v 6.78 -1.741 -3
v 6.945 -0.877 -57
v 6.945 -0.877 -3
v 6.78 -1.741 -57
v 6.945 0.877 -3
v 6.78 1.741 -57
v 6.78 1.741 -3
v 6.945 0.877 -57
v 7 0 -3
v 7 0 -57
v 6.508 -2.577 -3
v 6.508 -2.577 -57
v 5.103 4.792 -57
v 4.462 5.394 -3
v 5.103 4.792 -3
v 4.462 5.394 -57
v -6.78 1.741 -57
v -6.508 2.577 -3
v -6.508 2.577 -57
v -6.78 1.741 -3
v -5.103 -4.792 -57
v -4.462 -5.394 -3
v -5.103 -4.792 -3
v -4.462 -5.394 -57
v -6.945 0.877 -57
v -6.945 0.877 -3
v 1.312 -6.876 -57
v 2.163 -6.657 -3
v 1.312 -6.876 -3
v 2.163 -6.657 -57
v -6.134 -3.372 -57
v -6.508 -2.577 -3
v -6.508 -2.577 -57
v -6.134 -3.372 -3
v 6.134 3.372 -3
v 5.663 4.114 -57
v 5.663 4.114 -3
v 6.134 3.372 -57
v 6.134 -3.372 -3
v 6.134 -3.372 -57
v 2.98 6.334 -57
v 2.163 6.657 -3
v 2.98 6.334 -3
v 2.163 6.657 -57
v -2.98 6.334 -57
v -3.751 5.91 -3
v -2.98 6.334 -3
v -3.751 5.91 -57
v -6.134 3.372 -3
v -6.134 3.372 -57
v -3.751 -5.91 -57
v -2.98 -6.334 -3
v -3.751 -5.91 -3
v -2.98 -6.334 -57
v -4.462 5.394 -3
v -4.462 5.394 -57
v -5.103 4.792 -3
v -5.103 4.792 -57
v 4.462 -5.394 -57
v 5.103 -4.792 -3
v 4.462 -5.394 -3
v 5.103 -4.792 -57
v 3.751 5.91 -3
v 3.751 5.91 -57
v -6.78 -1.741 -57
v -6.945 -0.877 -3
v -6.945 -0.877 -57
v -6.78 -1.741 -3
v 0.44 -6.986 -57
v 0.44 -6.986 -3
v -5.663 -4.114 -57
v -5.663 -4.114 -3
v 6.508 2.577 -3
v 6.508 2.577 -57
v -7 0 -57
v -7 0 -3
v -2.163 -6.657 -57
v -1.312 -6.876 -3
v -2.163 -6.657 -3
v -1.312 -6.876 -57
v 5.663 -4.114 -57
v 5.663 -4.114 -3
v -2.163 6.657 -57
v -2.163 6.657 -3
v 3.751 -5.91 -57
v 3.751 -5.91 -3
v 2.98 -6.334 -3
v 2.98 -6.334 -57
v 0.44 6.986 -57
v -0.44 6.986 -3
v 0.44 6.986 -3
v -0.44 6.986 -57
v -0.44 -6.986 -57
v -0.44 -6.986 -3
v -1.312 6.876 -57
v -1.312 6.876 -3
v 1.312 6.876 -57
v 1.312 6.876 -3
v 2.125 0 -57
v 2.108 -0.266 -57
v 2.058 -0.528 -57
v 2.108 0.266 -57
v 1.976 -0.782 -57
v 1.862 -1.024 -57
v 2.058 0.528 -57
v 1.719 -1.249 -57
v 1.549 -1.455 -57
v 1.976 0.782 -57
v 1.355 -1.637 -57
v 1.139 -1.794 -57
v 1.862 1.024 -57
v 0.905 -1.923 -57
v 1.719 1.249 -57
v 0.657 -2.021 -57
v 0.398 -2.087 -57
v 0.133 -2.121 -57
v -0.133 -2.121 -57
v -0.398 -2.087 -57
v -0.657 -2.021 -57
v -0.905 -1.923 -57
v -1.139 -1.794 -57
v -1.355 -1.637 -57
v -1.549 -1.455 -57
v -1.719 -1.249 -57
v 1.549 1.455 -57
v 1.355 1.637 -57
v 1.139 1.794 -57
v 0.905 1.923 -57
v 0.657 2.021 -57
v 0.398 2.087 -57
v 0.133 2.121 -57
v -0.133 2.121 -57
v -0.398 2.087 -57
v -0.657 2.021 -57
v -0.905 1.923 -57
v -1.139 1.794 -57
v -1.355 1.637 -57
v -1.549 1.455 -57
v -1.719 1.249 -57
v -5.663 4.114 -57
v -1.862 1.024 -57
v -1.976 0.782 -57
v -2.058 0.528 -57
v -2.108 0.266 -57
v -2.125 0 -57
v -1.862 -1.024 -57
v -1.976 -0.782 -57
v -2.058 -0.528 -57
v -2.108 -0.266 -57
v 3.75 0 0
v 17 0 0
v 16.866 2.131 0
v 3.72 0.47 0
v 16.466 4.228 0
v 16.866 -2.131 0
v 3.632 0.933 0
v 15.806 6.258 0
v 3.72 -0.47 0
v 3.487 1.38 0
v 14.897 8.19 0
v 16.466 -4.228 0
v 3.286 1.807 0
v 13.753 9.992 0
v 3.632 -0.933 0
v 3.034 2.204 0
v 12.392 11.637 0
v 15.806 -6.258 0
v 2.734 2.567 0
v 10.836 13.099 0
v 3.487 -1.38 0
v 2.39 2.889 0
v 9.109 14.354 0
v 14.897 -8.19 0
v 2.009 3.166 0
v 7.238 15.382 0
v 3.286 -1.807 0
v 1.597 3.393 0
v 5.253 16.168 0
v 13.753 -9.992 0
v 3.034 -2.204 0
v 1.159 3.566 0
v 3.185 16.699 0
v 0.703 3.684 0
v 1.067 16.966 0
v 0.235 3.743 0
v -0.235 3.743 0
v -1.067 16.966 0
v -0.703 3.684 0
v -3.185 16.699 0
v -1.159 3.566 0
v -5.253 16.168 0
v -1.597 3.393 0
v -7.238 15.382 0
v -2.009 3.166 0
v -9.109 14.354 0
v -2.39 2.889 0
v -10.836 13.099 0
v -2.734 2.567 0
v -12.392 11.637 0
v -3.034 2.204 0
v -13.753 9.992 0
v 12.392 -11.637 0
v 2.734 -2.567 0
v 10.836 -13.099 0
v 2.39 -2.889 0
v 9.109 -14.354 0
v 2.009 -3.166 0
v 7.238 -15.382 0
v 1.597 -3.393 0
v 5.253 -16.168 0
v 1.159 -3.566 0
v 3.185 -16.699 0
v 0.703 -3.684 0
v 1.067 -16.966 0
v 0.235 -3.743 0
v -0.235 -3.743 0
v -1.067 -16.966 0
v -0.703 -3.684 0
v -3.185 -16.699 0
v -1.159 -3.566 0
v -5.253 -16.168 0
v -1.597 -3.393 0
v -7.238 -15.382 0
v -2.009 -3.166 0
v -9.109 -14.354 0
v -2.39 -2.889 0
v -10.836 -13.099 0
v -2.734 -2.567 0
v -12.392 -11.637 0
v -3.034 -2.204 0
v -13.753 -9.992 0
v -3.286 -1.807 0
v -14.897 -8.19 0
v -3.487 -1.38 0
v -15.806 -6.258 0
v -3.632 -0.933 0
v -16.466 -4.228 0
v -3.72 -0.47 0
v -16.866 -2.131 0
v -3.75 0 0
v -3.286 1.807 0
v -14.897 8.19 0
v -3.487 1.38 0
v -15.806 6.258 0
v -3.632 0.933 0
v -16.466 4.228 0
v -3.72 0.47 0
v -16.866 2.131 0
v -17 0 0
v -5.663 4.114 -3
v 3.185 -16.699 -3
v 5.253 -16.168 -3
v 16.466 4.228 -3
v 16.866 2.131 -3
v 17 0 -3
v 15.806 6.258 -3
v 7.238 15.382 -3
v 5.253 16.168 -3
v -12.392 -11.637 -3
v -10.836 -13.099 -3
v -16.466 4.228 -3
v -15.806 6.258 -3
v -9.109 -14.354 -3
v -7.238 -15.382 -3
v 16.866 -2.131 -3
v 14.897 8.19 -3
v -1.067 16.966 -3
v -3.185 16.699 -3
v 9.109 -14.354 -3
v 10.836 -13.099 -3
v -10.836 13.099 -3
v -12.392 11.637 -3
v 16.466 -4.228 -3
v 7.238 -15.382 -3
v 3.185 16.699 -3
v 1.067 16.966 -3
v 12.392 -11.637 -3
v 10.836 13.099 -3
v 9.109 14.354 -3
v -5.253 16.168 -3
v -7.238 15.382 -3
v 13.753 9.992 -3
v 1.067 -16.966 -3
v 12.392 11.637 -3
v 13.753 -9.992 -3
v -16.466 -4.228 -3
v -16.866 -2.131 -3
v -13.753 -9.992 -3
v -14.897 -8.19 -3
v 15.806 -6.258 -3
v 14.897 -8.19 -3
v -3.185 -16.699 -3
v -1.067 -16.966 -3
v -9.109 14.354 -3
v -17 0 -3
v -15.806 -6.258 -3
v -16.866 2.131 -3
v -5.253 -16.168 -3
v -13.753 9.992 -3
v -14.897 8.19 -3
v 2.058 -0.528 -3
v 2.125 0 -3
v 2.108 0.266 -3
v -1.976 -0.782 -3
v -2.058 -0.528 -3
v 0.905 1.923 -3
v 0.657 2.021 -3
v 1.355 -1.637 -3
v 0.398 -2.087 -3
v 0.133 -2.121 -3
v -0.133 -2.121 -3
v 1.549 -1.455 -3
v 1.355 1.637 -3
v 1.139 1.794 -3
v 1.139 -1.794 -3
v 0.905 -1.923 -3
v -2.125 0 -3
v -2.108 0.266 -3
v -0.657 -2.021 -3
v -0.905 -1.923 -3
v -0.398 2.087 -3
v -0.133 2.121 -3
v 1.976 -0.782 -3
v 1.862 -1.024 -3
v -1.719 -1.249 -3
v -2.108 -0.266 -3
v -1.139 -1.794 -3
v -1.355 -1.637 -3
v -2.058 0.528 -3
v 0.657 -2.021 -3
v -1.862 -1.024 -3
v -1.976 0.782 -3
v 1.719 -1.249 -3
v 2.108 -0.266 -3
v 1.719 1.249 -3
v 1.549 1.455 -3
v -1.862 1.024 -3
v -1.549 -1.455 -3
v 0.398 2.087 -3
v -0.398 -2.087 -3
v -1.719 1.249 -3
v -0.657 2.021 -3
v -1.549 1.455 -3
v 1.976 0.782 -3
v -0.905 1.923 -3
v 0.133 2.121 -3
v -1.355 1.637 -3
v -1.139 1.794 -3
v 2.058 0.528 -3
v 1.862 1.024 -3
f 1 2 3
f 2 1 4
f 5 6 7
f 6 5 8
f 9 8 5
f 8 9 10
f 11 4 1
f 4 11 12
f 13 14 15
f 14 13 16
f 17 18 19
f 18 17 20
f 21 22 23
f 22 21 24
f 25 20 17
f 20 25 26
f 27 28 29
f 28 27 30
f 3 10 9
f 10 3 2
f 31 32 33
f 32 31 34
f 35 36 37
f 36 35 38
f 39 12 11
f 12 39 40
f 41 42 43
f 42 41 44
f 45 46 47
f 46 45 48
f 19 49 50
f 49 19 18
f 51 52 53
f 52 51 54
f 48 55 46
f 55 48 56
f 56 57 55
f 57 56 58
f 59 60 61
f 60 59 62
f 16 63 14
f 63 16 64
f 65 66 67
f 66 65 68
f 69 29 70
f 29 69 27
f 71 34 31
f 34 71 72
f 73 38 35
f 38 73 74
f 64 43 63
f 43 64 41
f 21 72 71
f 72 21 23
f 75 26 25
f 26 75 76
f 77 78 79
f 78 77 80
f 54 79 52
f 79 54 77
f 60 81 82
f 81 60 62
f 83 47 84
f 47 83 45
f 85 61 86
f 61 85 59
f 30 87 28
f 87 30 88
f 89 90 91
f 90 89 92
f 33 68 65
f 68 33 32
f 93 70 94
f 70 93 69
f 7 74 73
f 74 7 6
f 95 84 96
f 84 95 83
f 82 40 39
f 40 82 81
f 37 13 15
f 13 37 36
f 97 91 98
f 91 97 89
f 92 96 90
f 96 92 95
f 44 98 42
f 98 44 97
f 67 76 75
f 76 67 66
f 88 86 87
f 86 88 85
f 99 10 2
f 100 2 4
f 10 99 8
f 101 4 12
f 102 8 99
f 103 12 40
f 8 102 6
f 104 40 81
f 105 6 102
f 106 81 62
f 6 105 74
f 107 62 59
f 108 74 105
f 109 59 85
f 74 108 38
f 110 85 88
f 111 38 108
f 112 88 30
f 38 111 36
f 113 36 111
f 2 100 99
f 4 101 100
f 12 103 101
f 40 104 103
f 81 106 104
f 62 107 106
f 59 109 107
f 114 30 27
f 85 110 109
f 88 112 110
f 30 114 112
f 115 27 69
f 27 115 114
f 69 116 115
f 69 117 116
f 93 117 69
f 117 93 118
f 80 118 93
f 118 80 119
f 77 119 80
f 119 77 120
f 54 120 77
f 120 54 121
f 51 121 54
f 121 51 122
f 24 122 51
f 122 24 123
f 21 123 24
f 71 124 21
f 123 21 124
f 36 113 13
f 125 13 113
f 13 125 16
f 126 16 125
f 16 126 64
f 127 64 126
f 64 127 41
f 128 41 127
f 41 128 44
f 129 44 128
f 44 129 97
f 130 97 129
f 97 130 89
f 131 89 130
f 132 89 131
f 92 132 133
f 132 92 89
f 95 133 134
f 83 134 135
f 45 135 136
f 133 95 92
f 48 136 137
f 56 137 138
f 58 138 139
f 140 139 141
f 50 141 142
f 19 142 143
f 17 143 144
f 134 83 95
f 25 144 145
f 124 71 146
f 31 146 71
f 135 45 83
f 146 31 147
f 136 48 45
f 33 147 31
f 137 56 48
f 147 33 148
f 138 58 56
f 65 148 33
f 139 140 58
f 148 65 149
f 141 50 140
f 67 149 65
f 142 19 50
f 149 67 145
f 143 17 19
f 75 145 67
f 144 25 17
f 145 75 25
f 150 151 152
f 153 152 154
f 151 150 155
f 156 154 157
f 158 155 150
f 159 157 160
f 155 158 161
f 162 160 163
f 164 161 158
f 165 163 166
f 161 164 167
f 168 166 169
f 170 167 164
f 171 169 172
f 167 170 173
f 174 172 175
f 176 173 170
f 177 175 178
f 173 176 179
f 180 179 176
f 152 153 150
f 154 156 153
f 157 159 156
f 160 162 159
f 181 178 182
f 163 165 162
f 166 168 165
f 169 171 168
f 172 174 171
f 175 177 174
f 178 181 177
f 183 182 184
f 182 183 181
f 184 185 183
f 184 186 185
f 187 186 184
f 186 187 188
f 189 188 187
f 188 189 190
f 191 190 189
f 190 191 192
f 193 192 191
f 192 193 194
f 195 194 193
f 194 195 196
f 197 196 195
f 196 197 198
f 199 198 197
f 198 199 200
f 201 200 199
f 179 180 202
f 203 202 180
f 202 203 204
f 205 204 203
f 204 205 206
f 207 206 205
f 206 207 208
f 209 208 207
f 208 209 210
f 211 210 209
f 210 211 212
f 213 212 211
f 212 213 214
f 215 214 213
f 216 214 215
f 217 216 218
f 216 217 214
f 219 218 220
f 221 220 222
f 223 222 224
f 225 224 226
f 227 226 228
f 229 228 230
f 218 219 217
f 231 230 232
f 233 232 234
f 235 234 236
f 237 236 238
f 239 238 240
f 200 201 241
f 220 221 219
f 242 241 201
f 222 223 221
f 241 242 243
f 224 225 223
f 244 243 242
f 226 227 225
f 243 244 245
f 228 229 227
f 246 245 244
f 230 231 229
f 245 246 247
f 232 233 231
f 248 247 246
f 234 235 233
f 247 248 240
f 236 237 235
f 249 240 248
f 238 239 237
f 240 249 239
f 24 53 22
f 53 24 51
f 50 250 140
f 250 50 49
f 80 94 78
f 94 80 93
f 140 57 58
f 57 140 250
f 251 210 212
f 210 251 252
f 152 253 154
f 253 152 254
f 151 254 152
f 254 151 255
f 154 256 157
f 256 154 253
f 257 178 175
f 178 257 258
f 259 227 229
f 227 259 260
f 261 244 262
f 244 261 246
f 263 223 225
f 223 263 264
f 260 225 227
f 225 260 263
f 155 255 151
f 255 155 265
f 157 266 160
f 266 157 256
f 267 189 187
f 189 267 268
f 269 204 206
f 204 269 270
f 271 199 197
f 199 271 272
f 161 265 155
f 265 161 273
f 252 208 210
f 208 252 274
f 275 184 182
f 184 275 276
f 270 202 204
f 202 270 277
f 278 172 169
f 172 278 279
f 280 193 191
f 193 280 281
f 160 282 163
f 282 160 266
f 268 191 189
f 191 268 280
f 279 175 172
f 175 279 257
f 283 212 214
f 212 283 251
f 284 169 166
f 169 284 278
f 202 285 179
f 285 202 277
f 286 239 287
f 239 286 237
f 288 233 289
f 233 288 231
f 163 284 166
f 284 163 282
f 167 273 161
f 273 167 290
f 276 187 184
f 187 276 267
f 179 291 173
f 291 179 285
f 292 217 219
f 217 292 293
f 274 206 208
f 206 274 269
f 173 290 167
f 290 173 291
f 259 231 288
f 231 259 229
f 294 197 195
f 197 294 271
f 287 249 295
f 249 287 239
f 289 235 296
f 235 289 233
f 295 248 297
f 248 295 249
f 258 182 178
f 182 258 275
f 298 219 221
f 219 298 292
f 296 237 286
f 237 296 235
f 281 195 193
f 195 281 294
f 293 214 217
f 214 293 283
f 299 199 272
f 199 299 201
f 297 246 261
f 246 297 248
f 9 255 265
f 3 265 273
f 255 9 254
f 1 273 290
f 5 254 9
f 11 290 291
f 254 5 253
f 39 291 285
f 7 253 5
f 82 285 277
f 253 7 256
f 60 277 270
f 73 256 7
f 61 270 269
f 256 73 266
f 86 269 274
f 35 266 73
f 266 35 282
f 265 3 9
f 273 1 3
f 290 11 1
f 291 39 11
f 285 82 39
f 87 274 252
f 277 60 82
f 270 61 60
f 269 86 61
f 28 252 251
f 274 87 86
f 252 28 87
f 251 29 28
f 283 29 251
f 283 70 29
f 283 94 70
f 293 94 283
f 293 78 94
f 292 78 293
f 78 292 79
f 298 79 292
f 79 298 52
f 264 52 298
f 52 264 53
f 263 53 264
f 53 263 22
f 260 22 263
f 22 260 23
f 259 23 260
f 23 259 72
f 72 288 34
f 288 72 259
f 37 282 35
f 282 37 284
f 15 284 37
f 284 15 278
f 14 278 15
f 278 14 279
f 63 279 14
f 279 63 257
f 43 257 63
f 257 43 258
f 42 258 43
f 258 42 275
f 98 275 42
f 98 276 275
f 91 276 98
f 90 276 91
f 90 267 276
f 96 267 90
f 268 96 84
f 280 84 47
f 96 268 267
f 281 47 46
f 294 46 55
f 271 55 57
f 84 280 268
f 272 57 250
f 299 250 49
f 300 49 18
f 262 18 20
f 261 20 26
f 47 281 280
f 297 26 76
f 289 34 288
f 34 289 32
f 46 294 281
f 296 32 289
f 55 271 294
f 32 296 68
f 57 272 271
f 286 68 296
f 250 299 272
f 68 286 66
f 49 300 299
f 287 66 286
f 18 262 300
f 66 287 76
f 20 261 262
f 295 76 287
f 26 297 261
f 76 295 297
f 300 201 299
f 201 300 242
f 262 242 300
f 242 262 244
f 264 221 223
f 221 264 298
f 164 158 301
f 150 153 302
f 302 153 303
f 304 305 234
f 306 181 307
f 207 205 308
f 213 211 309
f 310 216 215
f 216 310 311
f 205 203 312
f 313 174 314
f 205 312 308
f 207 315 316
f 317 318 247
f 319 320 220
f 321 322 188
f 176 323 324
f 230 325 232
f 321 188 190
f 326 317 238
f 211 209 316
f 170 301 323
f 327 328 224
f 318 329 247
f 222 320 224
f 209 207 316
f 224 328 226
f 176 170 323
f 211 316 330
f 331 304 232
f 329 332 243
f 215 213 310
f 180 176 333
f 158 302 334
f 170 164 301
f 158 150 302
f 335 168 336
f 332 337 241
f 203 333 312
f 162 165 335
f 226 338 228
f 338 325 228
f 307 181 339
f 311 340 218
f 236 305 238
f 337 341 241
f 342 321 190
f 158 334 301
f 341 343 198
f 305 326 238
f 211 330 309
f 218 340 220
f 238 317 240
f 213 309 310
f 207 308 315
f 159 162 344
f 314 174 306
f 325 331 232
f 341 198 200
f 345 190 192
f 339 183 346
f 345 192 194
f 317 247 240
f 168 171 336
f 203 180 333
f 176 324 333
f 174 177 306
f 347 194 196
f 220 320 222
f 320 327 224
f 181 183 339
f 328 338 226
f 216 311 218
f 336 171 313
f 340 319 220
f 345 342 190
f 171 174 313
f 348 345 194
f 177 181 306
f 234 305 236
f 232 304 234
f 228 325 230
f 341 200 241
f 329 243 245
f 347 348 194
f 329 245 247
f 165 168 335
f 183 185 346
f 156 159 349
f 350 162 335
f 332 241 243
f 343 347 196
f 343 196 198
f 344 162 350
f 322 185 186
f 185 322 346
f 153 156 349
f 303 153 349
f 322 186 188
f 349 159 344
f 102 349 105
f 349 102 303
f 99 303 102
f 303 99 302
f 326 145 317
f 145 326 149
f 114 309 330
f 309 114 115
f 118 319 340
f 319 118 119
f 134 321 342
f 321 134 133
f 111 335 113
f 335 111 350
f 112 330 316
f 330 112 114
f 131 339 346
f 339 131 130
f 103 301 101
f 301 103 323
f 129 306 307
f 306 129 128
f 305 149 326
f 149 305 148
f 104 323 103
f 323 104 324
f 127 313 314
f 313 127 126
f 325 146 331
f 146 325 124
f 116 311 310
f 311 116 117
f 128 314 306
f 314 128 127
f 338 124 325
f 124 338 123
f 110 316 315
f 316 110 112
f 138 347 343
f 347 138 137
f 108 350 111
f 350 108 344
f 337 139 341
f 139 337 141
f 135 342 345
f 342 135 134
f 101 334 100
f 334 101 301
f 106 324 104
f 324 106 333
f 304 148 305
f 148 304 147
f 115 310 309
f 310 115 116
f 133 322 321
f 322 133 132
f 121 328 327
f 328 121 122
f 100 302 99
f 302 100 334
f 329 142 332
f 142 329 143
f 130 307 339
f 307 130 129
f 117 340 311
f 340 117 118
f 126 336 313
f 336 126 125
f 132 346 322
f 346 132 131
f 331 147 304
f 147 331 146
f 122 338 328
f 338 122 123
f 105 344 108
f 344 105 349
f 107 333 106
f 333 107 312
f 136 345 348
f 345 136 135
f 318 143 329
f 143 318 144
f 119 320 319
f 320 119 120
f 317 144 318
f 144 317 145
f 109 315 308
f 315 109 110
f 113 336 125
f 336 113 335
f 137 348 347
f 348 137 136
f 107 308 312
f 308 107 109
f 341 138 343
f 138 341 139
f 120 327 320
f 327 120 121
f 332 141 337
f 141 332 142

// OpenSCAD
$fn = 50;


difference() {
	union() {
		translate(v = [0, 0, -57.0000000000]) {
			cylinder(h = 57, r = 7.0000000000);
		}
		translate(v = [0, 0, -3.0000000000]) {
			cylinder(h = 3, r = 17.0000000000);
		}
	}
	union() {
		translate(v = [0, 0, 0]) {
			rotate(a = [0, 0, 0]) {
				difference() {
					union() {
						#translate(v = [0, 0, -57.0000000000]) {
							cylinder(h = 57, r = 2.0000000000);
						}
						#translate(v = [0, 0, -3]) {
							cylinder(h = 3, r1 = 2.1250000000, r2 = 3.7500000000);
						}
						#translate(v = [0, 0, -57.0000000000]) {
							cylinder(h = 57, r = 2.1250000000);
						}
						#translate(v = [0, 0, -57.0000000000]) {
							cylinder(h = 57, r = 2.0000000000);
						}
					}
					union();
				}
			}
		}
	}
}
